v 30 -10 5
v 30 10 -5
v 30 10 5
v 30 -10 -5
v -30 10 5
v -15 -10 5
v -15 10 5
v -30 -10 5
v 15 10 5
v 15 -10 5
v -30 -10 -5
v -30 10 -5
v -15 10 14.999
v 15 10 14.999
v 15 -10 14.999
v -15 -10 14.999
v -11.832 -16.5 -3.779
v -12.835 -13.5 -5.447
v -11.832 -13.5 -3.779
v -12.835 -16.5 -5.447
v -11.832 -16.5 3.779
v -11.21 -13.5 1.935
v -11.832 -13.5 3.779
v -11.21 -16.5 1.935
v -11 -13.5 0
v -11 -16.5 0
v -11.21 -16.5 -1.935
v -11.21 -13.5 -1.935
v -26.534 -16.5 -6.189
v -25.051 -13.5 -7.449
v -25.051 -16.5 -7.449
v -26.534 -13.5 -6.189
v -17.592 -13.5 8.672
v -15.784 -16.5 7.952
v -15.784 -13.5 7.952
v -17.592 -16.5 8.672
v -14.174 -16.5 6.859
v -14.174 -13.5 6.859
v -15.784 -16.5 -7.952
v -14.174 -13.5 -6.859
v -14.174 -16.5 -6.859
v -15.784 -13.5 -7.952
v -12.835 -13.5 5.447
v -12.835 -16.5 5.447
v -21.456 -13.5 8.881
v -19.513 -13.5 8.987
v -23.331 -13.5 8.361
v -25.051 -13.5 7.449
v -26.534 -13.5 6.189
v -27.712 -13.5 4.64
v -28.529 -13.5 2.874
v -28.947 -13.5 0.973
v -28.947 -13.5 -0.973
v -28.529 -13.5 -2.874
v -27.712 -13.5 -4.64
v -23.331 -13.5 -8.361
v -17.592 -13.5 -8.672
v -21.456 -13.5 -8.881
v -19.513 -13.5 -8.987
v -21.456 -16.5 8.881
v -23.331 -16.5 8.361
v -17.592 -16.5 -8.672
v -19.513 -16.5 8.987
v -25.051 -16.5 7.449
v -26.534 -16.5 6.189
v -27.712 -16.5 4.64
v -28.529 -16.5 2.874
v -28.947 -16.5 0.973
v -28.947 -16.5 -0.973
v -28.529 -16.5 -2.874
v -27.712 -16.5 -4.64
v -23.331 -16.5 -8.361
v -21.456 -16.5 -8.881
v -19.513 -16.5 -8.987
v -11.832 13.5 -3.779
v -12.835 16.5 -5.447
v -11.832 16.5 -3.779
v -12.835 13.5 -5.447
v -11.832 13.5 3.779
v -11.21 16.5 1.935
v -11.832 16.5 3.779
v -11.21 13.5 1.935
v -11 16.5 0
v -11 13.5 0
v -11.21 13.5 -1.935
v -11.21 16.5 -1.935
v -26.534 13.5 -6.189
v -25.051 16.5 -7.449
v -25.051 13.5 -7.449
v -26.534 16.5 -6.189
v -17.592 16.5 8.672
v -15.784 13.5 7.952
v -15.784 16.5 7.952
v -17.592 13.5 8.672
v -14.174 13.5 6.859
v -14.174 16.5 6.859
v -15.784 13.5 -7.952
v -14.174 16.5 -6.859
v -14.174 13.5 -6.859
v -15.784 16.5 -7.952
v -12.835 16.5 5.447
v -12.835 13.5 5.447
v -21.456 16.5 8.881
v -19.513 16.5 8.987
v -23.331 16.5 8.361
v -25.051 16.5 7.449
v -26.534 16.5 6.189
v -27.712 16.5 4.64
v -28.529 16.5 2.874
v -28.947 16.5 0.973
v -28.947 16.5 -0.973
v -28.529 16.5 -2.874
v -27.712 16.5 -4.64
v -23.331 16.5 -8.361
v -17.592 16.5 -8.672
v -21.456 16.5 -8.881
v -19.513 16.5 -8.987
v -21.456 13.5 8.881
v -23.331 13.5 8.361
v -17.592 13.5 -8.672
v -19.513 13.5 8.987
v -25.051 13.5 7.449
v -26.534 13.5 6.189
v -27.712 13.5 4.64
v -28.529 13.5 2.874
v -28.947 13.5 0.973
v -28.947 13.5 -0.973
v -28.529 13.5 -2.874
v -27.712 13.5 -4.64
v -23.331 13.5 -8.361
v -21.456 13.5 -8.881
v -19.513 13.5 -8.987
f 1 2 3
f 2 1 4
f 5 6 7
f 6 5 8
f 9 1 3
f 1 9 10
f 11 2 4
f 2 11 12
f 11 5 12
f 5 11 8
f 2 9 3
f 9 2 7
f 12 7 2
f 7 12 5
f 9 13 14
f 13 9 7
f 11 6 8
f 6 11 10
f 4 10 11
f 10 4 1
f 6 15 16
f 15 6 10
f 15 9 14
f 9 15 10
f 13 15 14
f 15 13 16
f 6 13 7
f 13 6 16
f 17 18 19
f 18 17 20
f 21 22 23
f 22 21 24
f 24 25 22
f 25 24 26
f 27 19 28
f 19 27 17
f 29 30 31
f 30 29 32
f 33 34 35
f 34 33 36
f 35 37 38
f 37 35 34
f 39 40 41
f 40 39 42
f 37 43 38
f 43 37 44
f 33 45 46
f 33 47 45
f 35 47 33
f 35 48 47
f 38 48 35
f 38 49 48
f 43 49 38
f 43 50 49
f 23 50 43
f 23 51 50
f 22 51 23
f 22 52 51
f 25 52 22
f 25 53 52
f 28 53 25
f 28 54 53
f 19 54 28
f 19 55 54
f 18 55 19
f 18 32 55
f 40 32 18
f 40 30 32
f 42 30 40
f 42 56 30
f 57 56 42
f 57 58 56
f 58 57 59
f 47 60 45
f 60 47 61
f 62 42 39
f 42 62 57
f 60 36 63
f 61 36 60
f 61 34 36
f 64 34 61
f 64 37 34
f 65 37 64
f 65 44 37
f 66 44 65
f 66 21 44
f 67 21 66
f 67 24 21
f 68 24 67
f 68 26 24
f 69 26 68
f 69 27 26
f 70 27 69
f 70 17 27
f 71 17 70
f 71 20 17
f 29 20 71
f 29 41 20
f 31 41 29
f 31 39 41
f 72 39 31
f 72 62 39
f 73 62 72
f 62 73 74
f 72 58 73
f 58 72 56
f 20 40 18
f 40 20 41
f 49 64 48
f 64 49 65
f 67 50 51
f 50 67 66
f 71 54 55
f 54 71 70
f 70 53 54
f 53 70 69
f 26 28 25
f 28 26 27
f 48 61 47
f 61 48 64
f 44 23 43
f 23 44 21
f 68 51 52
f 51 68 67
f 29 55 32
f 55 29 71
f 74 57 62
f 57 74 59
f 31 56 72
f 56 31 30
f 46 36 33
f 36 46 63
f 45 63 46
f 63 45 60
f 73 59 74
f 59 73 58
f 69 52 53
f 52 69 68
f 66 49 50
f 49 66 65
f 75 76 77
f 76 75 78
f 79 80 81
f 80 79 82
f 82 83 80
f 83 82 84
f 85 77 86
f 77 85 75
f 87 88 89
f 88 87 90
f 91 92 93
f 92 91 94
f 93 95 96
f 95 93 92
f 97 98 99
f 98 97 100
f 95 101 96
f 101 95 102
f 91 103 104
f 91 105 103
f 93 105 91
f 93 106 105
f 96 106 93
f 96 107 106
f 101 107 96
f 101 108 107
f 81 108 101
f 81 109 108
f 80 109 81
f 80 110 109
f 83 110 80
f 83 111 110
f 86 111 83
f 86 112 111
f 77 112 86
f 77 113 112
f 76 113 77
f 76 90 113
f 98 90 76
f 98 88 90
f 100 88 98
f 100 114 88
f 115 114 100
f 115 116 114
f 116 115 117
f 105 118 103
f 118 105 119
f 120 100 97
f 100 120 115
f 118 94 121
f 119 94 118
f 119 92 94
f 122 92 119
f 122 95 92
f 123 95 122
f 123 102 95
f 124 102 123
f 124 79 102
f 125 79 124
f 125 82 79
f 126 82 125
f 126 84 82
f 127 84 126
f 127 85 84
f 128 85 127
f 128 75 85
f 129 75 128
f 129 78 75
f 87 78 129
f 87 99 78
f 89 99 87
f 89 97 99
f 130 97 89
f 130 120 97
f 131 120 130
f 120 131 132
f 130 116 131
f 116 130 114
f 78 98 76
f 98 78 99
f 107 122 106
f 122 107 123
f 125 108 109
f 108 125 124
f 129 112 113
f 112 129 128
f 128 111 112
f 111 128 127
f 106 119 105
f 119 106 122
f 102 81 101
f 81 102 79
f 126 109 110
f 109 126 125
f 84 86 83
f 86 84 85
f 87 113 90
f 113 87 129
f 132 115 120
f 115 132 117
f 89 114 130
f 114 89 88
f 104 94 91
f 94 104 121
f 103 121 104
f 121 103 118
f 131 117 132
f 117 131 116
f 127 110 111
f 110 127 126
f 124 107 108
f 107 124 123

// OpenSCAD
cube([60,20,10],center=true);
translate([0,0,10-0.001])
    cube([30,20,10],center=true);
// left front wheel
translate([-20,-15,0])
rotate([90,0,0])
    cylinder(h=3, r=9, center=true);
    
// right front wheel
translate([-20,15,0])
rotate([90,0,0])
    cylinder(h=3, r=9, center=true);
